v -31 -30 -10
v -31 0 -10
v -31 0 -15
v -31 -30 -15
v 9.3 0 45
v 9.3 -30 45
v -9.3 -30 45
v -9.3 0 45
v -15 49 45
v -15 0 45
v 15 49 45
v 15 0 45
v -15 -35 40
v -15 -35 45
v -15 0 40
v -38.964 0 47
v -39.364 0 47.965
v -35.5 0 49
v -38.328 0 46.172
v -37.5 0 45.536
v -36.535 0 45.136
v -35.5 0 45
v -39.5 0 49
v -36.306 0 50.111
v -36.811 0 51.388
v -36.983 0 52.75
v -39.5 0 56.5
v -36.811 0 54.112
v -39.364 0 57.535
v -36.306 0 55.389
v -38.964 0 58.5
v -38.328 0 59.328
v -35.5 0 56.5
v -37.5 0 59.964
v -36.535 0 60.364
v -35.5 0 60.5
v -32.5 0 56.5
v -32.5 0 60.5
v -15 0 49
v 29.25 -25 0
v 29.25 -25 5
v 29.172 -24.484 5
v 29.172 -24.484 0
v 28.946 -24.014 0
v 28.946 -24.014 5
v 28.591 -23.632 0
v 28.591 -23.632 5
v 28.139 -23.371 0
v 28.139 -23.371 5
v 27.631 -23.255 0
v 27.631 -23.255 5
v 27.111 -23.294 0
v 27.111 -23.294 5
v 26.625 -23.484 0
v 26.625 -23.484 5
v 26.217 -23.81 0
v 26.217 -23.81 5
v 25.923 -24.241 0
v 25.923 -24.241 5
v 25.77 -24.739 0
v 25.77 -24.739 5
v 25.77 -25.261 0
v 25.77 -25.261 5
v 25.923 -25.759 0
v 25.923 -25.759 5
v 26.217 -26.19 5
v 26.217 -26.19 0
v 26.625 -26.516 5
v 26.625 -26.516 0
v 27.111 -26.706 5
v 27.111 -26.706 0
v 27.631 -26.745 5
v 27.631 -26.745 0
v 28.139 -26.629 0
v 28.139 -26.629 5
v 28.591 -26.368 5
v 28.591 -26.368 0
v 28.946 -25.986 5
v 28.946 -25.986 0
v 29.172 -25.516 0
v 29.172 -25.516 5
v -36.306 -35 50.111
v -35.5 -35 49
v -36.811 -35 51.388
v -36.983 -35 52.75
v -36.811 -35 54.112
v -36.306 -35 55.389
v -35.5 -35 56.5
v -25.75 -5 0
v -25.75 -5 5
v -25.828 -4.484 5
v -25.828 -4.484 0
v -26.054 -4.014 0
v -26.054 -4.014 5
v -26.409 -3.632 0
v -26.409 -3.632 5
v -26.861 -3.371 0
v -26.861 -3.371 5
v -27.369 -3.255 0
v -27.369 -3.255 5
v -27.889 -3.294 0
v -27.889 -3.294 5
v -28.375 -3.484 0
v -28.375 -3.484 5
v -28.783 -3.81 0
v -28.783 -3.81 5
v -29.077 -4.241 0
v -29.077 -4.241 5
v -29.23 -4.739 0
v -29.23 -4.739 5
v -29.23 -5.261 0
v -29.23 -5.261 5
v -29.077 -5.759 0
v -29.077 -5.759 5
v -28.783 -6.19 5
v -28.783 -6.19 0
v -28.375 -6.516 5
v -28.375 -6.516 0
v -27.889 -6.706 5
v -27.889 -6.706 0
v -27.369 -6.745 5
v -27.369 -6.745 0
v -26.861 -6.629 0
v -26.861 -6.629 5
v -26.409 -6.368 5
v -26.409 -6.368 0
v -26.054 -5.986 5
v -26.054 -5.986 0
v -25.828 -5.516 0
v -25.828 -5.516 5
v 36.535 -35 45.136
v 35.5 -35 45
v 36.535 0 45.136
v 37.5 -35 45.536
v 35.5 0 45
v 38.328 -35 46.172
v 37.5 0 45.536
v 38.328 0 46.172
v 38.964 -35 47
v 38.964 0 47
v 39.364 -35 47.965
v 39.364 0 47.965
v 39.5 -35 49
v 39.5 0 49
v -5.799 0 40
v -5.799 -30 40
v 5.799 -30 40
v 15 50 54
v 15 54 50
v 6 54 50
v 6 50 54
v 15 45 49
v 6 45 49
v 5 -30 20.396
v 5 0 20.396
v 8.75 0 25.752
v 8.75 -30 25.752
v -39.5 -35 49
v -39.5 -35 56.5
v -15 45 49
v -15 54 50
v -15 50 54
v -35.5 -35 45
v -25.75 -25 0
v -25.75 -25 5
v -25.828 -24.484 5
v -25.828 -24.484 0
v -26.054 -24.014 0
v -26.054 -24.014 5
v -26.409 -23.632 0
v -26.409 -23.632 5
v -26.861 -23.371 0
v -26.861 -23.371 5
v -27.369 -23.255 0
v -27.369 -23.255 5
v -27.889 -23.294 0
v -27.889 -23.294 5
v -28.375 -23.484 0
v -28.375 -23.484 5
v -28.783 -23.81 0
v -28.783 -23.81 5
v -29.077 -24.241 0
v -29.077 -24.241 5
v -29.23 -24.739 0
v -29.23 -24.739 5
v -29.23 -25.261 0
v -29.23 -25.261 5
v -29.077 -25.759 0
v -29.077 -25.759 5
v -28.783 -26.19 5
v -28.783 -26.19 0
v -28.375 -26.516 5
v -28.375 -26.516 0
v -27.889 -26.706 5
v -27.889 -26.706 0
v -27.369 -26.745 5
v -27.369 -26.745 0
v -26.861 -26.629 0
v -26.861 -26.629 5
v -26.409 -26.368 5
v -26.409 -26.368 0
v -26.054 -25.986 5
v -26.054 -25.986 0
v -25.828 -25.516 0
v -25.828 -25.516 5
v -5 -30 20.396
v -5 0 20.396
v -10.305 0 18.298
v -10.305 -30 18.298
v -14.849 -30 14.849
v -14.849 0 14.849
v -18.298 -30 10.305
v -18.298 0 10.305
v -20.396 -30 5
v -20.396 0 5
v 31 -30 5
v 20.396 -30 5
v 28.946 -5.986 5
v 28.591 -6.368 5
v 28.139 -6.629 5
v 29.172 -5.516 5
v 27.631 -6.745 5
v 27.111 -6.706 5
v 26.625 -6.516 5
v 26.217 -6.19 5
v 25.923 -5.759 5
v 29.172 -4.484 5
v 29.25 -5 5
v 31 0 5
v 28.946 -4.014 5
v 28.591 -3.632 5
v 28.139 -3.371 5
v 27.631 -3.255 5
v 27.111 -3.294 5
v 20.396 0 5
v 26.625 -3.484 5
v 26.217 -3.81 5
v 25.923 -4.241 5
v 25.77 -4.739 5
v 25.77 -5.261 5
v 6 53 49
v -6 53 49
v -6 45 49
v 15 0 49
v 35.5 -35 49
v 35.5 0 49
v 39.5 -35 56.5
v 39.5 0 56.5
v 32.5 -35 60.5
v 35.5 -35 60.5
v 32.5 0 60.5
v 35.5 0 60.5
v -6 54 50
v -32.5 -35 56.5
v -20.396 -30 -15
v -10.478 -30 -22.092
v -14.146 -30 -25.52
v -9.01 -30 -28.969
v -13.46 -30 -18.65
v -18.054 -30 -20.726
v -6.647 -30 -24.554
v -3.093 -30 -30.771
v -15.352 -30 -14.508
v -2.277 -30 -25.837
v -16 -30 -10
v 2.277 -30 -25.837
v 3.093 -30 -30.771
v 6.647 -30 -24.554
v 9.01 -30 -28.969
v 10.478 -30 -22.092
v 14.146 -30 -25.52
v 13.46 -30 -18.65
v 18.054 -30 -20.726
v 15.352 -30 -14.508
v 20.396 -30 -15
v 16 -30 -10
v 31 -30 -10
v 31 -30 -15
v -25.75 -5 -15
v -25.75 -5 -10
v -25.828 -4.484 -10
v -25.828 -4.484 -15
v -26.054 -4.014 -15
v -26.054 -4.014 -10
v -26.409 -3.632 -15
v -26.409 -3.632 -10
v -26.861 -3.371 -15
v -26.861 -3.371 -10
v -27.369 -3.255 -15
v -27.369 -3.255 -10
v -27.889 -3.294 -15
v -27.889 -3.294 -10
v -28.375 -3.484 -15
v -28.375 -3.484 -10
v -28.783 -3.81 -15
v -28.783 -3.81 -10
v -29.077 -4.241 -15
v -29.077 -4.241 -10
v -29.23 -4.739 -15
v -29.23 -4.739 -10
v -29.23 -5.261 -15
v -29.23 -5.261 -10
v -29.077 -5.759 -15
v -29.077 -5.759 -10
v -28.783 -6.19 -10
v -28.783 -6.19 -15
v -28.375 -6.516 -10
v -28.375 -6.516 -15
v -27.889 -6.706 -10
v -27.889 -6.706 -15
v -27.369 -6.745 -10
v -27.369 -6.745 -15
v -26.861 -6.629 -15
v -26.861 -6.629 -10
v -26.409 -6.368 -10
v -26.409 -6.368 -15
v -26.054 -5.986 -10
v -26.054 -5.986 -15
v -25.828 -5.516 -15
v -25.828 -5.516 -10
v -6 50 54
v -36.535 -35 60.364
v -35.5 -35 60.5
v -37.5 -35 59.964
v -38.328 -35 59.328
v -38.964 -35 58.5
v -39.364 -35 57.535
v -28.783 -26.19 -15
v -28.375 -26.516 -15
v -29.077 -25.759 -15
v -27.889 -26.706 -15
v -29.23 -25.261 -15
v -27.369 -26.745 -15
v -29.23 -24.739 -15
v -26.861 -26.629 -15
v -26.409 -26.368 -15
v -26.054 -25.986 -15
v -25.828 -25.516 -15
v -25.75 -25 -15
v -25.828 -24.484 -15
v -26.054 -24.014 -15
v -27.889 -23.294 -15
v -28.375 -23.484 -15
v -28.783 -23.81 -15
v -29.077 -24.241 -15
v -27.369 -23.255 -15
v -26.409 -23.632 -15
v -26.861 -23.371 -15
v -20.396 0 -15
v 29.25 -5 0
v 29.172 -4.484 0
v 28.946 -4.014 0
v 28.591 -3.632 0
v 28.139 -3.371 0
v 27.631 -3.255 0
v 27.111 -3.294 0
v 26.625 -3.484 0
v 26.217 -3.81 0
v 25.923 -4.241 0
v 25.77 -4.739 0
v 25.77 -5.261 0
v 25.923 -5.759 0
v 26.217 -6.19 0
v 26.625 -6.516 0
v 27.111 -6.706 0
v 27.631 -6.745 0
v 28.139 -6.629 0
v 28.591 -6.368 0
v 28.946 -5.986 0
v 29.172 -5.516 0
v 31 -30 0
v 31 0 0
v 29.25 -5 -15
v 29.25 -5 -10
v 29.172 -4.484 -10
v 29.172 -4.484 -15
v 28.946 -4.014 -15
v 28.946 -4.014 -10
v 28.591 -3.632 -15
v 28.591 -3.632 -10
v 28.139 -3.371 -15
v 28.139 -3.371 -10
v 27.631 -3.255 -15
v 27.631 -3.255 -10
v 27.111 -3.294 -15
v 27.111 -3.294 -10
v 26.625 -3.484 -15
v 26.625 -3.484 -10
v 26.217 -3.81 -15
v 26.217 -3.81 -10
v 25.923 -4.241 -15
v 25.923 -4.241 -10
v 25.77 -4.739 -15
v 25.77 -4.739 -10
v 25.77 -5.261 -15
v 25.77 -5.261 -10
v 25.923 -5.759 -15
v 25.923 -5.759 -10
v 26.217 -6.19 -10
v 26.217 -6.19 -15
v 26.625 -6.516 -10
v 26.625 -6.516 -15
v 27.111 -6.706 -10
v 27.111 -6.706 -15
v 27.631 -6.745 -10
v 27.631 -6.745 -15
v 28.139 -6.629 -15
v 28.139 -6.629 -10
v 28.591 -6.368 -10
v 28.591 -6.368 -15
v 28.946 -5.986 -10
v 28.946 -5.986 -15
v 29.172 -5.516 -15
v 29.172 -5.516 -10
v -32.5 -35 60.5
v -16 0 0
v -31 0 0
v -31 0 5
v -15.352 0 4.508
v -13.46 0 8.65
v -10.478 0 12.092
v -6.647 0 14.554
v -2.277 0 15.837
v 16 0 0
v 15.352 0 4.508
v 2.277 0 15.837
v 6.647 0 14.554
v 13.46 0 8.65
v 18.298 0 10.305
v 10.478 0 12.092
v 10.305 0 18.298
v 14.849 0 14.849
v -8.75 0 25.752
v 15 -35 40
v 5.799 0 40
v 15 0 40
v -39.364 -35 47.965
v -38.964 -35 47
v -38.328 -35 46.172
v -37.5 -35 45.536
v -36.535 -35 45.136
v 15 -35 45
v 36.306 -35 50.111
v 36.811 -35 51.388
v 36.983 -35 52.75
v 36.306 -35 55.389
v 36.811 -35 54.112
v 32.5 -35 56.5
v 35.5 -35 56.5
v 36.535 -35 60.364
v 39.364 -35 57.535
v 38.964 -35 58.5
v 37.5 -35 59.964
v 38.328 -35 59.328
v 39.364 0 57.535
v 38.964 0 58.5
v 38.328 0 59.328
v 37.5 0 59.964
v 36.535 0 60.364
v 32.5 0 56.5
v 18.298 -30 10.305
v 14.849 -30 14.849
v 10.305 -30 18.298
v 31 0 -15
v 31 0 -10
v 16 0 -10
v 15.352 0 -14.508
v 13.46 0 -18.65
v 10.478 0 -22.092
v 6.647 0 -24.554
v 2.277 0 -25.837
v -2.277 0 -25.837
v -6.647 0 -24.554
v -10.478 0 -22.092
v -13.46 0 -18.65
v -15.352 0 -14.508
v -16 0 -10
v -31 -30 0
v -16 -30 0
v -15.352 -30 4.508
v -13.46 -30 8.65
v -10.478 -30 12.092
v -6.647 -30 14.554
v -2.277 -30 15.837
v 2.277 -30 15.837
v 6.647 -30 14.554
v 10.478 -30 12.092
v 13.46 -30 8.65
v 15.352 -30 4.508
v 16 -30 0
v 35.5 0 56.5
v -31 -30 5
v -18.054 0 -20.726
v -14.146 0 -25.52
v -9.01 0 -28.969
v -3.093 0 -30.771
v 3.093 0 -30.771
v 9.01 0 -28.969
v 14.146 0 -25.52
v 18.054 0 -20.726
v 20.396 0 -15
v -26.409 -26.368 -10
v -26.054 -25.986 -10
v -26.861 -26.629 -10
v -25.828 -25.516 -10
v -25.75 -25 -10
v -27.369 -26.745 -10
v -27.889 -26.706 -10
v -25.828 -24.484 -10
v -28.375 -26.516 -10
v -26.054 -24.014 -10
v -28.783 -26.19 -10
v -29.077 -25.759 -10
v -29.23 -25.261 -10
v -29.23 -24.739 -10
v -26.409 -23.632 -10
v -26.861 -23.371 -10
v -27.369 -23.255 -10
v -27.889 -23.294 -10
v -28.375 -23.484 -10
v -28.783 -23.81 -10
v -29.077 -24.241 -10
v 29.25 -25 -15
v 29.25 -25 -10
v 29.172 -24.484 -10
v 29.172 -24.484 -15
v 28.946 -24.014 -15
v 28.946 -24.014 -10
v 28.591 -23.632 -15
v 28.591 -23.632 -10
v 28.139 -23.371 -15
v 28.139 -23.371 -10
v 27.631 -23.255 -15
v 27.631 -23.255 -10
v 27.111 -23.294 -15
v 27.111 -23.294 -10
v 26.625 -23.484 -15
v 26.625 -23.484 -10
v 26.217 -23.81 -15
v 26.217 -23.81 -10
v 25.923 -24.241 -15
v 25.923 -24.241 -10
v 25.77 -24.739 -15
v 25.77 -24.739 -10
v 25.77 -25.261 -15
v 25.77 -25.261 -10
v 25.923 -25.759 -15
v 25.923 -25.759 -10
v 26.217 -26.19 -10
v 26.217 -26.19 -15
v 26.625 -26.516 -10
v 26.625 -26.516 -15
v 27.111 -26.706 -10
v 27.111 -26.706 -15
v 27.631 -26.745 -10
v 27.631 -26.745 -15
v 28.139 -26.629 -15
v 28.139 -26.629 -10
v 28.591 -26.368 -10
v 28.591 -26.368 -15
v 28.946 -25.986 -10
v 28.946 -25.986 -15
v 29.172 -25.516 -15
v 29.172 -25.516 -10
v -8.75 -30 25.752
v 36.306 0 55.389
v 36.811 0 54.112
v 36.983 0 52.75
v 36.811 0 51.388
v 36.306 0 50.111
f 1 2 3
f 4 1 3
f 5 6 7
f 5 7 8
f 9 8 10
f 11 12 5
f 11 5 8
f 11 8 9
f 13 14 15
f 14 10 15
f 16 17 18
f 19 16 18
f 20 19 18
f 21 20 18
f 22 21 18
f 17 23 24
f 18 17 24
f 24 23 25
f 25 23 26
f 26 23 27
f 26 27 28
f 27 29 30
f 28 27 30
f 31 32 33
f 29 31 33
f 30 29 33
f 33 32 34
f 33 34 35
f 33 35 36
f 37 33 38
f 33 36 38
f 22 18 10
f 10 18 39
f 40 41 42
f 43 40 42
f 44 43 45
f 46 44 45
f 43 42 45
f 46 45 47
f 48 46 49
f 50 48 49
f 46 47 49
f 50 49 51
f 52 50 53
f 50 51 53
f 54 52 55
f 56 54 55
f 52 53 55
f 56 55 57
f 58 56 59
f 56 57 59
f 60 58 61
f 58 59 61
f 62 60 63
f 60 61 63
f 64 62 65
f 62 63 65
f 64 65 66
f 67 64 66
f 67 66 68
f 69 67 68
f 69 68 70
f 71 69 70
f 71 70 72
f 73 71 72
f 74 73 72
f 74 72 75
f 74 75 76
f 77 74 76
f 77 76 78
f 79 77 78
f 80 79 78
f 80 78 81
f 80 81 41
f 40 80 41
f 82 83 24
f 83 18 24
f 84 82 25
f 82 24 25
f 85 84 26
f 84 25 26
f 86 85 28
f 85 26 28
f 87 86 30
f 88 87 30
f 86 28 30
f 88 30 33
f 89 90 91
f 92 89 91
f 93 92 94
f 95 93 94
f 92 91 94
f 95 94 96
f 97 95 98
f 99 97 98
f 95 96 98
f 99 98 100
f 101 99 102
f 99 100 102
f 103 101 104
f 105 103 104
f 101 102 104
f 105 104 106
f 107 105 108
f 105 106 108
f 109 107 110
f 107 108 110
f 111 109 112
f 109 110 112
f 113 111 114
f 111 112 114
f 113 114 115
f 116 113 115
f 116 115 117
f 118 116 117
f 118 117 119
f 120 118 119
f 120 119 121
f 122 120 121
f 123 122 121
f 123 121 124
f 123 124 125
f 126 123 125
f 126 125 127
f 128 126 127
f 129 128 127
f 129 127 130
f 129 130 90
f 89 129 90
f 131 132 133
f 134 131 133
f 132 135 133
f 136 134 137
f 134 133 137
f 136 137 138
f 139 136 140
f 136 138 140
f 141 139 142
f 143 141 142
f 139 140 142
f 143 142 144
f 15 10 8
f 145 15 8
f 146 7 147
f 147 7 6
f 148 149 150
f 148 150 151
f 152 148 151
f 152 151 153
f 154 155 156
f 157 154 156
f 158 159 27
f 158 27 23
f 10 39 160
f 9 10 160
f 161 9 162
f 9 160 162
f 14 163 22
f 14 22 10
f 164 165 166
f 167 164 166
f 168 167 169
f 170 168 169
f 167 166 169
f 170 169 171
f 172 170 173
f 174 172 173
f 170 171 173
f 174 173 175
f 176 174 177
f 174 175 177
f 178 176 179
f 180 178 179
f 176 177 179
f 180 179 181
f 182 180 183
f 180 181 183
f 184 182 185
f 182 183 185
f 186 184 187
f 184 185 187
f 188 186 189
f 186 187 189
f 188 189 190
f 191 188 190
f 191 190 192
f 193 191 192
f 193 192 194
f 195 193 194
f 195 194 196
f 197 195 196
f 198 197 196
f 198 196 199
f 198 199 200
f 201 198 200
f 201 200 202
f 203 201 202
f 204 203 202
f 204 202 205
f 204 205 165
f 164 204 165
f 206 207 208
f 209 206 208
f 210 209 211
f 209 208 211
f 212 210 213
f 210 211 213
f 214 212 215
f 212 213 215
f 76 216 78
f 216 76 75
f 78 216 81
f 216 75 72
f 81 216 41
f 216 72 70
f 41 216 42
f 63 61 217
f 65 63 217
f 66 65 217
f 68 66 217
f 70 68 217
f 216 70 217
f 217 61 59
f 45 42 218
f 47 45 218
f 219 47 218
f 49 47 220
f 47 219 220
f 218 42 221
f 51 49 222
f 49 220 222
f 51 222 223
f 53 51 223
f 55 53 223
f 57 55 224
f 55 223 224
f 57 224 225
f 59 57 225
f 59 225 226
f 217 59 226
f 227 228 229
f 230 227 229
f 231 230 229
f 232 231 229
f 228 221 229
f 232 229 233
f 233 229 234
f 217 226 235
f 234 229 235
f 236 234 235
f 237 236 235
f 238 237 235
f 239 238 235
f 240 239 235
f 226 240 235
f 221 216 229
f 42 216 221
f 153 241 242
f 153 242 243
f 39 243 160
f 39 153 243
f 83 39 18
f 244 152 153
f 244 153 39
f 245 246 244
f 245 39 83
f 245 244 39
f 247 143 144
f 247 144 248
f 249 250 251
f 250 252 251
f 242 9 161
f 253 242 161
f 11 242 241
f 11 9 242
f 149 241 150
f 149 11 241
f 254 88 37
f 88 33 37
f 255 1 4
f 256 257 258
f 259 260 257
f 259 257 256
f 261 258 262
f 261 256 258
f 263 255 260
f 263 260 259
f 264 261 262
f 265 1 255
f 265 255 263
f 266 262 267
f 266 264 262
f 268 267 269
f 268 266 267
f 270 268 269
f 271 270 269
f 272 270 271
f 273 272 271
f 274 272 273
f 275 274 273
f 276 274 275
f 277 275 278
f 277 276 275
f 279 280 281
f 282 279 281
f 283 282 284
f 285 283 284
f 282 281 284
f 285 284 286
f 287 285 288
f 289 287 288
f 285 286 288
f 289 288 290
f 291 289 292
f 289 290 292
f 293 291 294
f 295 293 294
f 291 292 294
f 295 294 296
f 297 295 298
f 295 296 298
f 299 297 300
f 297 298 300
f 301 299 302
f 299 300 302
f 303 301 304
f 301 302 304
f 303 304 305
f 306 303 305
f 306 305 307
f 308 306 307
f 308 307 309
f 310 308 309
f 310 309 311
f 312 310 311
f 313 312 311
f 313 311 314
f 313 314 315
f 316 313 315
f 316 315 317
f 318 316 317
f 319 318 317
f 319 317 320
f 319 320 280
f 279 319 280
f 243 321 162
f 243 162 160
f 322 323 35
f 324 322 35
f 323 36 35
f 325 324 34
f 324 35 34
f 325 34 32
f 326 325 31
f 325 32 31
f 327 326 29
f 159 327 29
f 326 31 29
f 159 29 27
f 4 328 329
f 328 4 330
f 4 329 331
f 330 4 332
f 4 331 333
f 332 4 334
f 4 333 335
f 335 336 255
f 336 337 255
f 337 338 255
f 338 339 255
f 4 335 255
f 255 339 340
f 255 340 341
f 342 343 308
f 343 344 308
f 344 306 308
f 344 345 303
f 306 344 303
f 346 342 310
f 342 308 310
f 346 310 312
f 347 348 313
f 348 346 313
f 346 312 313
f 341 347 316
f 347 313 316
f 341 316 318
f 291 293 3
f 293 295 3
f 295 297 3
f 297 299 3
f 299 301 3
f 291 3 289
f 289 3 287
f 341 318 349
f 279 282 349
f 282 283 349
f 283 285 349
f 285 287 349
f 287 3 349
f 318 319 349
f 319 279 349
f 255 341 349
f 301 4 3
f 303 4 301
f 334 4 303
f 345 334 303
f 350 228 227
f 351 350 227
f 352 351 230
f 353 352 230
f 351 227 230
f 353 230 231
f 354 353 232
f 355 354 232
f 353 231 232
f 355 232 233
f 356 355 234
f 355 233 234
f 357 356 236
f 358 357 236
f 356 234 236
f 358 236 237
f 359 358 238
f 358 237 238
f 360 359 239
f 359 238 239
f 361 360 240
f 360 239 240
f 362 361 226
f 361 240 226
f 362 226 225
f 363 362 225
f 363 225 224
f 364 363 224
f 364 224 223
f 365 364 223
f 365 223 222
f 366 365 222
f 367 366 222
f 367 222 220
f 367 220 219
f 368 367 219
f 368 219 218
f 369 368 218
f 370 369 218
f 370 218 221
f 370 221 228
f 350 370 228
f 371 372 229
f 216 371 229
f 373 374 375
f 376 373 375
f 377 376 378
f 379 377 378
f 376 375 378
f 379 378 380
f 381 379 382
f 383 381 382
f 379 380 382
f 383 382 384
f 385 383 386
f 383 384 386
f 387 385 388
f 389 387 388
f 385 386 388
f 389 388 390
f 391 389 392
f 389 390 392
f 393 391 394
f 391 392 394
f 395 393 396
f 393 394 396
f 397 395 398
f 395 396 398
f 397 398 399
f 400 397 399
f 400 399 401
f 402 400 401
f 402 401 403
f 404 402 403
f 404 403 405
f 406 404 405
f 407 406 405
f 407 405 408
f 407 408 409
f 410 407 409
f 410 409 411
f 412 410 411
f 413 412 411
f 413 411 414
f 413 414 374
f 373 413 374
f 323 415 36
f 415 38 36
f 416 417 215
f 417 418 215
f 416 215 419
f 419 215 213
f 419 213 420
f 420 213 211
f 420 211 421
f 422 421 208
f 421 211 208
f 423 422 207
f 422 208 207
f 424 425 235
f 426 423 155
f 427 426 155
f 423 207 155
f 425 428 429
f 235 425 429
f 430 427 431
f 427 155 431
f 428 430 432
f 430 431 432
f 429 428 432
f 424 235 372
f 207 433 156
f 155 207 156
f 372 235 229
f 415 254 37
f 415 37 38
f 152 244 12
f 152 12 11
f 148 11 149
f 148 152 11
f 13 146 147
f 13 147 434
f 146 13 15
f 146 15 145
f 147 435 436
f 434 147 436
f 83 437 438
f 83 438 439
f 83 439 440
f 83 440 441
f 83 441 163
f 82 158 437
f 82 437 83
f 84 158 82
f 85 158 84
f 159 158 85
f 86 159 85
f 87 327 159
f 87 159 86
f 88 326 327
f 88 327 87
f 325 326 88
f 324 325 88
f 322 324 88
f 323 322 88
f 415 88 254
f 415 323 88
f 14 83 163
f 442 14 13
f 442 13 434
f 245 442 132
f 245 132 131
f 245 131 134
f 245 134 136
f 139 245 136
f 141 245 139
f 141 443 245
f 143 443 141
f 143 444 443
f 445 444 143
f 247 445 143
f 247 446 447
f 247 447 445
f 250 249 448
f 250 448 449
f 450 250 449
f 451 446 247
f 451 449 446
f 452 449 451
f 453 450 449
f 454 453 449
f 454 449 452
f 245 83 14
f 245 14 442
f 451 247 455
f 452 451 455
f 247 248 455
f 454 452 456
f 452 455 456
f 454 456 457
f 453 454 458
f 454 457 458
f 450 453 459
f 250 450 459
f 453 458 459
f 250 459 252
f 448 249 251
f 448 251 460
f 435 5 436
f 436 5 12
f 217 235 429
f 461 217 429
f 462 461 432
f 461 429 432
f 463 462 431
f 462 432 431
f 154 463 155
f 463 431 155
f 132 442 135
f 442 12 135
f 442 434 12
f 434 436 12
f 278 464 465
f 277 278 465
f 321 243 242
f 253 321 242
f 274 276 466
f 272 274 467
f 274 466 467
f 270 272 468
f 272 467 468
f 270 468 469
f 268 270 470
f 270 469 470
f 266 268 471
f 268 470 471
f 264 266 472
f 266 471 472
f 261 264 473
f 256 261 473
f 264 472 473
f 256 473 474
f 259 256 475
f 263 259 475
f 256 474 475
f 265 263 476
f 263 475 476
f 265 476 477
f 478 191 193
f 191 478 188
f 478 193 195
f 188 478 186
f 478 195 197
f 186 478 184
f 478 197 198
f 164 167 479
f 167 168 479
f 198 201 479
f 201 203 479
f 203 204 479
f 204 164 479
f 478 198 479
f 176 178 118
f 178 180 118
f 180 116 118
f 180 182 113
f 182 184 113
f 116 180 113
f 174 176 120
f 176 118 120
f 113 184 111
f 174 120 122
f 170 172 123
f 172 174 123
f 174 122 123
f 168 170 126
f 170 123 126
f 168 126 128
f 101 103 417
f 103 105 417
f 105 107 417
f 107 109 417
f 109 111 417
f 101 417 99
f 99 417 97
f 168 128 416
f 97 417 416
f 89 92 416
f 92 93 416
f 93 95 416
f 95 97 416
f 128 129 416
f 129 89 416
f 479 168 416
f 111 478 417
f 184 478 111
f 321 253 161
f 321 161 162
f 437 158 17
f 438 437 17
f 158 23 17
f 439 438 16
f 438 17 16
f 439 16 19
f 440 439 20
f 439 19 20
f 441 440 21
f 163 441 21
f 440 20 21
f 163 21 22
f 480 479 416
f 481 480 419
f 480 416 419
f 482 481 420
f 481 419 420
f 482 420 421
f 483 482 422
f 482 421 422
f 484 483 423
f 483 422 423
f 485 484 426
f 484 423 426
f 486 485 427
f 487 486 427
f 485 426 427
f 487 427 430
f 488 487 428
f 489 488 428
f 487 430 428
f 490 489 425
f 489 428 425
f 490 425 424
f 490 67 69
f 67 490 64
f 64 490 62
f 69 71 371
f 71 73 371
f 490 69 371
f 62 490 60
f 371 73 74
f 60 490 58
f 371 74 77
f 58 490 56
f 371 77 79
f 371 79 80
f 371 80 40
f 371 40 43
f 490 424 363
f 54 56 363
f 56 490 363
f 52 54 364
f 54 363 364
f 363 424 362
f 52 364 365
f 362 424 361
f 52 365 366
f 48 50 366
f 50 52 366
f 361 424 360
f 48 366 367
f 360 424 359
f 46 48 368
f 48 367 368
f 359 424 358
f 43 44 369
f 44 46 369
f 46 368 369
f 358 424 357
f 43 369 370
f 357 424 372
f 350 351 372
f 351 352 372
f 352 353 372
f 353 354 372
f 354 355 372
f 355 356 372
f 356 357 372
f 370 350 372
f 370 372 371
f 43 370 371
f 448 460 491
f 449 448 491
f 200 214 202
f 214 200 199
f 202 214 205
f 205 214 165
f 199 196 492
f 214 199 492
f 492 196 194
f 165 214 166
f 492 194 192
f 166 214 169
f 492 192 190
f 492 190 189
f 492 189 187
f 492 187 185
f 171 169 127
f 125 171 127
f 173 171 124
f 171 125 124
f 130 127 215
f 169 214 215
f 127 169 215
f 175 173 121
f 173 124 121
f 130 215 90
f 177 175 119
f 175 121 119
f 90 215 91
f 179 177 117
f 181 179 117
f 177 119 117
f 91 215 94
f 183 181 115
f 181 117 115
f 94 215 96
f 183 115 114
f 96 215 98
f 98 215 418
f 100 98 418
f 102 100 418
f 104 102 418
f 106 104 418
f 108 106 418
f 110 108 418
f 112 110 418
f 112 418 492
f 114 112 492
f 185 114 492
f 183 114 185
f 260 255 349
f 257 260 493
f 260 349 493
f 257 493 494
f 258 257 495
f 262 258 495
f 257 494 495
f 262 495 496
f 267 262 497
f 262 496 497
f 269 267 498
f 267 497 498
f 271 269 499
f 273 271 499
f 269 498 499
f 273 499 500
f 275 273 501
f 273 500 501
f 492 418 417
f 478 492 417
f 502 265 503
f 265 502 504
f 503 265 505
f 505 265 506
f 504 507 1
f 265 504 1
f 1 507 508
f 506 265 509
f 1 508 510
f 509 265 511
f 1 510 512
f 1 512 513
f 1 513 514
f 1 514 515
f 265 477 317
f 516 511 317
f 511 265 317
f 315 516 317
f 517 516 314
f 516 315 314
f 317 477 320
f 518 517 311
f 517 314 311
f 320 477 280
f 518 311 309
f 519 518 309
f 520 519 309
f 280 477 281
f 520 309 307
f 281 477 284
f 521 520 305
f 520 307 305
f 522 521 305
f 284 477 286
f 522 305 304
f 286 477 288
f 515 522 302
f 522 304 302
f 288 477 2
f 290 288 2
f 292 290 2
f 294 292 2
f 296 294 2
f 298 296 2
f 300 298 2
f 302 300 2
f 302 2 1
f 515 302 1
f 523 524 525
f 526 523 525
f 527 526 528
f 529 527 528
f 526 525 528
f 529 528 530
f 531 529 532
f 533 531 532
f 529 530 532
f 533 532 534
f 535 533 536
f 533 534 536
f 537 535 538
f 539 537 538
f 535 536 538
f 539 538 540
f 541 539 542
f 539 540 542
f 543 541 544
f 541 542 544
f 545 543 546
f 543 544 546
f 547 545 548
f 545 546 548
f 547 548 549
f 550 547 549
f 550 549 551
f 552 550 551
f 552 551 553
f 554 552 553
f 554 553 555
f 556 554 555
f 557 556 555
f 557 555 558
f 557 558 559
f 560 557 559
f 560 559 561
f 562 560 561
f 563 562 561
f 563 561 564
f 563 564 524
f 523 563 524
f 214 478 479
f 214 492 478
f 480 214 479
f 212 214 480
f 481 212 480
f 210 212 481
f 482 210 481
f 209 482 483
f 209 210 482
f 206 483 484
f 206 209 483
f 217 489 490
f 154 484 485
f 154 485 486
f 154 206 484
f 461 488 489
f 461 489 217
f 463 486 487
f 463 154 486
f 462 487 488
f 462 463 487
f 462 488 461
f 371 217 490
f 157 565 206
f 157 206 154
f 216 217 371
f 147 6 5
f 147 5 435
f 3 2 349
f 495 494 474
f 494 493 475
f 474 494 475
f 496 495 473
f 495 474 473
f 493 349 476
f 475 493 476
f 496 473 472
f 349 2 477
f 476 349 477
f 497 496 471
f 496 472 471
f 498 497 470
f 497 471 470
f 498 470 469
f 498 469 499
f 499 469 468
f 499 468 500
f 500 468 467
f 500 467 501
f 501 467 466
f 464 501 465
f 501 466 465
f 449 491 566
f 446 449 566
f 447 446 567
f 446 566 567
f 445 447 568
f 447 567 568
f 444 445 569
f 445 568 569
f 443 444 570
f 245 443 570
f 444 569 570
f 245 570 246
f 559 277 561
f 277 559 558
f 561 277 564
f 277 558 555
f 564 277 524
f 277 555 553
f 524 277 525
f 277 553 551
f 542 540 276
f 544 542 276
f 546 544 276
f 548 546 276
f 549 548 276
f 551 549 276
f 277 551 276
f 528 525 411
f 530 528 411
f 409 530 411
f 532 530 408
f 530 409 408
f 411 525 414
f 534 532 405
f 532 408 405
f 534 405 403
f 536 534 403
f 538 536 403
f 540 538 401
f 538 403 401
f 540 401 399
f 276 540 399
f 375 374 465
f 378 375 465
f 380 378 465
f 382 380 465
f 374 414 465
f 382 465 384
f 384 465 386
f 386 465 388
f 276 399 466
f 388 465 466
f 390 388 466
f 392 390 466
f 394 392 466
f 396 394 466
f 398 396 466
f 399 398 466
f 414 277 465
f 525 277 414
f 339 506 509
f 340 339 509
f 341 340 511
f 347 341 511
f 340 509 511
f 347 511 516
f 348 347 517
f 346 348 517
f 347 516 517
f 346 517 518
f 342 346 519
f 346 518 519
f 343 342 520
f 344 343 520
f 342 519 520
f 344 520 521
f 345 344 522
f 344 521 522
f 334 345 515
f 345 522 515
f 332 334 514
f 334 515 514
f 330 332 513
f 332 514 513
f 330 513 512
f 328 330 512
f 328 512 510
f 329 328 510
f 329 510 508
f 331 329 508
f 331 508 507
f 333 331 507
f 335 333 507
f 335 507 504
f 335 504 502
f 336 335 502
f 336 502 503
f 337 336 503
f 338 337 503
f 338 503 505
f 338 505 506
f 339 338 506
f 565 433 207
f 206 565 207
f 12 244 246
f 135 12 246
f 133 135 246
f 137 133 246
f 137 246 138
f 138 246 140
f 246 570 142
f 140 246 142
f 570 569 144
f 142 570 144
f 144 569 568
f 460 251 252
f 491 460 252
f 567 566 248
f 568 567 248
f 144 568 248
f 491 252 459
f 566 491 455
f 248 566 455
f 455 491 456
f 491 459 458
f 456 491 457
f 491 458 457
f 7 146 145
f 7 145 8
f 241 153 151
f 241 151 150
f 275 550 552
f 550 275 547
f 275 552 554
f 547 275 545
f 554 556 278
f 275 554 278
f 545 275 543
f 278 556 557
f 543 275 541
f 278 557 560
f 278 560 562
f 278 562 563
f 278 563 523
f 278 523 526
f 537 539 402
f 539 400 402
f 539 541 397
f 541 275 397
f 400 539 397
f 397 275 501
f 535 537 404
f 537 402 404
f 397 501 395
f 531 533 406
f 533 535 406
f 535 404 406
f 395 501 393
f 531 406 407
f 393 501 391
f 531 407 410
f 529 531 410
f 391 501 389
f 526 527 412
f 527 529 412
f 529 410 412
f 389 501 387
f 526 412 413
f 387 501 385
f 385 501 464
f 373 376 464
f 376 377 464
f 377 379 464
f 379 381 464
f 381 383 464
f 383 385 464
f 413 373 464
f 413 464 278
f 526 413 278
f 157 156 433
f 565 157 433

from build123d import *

# Parameters (mm, degrees)
F3_DEPTH      = 30
F4_DEPTH      = 5
F6_DEPTH      = 15
F6_DEPTH_BACK = 15
F7_DEPTH      = 6
F8_DEPTH      = 30
F9_DEPTH      = 30
F10_R         = 1.75
F11_DEPTH     = 50


# Not quite as in the source:
# - a feature names something its author has since deleted; it is built from what else it names


with BuildPart() as f3:
    # F2 (on offset) → F3 (new body)
    with BuildSketch(Plane.XZ.offset(30)):
        with BuildLine():
            Line((35.5, 49), (-35.5, 49))
            ThreePointArc((-35.5, 49), (-36.9829280499, 52.75), (-35.5, 56.5))
            Line((-35.5, 56.5), (-32.5, 56.5))
            Line((-32.5, 56.5), (-32.5, 60.5))
            Line((-32.5, 60.5), (-35.5, 60.5))
            ThreePointArc((-35.5, 60.5), (-38.3284271247, 59.3284271247), (-39.5, 56.5))
            Line((-39.5, 56.5), (-39.5, 49))
            ThreePointArc((-39.5, 49), (-38.3284271247, 46.1715728753), (-35.5, 45))
            Line((-35.5, 45), (-15, 45))
            Line((-15, 45), (-15, 40))
            Line((-15, 40), (-5.798962309, 40))
            Line((-5.798962309, 40), (-9.3, 45))
            Line((-9.3, 45), (9.3, 45))
            Line((9.3, 45), (5.798962309, 40))
            Line((5.798962309, 40), (15, 40))
            Line((15, 40), (15, 45))
            Line((15, 45), (35.5, 45))
            ThreePointArc((35.5, 45), (38.3284271247, 46.1715728753), (39.5, 49))
            Line((39.5, 49), (39.5, 56.5))
            ThreePointArc((39.5, 56.5), (38.3284271247, 59.3284271247), (35.5, 60.5))
            Line((35.5, 60.5), (32.5, 60.5))
            Line((32.5, 60.5), (32.5, 56.5))
            Line((32.5, 56.5), (35.5, 56.5))
            ThreePointArc((35.5, 56.5), (36.9829280499, 52.75), (35.5, 49))
        make_face()
    extrude(amount=-F3_DEPTH)

    # F2 (on offset) → F4 (join)
    with BuildSketch(Plane.XZ.offset(30)):
        with BuildLine():
            Line((35.5, 49), (-35.5, 49))
            ThreePointArc((-35.5, 49), (-36.9829280499, 52.75), (-35.5, 56.5))
            Line((-35.5, 56.5), (-32.5, 56.5))
            Line((-32.5, 56.5), (-32.5, 60.5))
            Line((-32.5, 60.5), (-35.5, 60.5))
            ThreePointArc((-35.5, 60.5), (-38.3284271247, 59.3284271247), (-39.5, 56.5))
            Line((-39.5, 56.5), (-39.5, 49))
            ThreePointArc((-39.5, 49), (-38.3284271247, 46.1715728753), (-35.5, 45))
            Line((-35.5, 45), (-15, 45))
            Line((-15, 45), (-15, 40))
            Line((-15, 40), (-5.798962309, 40))
            Line((-5.798962309, 40), (-9.3, 45))
            Line((-9.3, 45), (9.3, 45))
            Line((9.3, 45), (5.798962309, 40))
            Line((5.798962309, 40), (15, 40))
            Line((15, 40), (15, 45))
            Line((15, 45), (35.5, 45))
            ThreePointArc((35.5, 45), (38.3284271247, 46.1715728753), (39.5, 49))
            Line((39.5, 49), (39.5, 56.5))
            ThreePointArc((39.5, 56.5), (38.3284271247, 59.3284271247), (35.5, 60.5))
            Line((35.5, 60.5), (32.5, 60.5))
            Line((32.5, 60.5), (32.5, 56.5))
            Line((32.5, 56.5), (35.5, 56.5))
            ThreePointArc((35.5, 56.5), (36.9829280499, 52.75), (35.5, 49))
        make_face()
        Polygon((-9.3, 45), (-5.798962309, 40), (5.798962309, 40), (9.3, 45), align=None)
    extrude(amount=F4_DEPTH)

    # F5 (on Right) → F6 (join, two sides)
    with BuildSketch(Plane.YZ) as f6_sk:
        Polygon((45, 49), (0, 49), (0, 45), (49, 45), (53, 49), align=None)
        Polygon((50, 54), (45, 49), (53, 49), (54, 50), align=None)
    extrude(amount=F6_DEPTH)
    extrude(f6_sk.sketch, amount=-F6_DEPTH_BACK)

    # F5 (on Right) → F7 (cut, symmetric)
    with BuildSketch(Plane.YZ):
        Polygon((50, 54), (45, 49), (53, 49), (54, 50), align=None)
    extrude(amount=F7_DEPTH, both=True, mode=Mode.SUBTRACT)


with BuildPart() as f8:
    # F0 (on Front) → F8 (new body)
    with BuildSketch(Plane.XZ):
        with BuildLine():
            Line((-31, 0), (-21, 0))
            ThreePointArc((-21, 0), (-20.8484728355, 2.5181700556), (-20.3960780544, 5))
            Line((-20.3960780544, 5), (-31, 5))
            Line((-31, 5), (-31, 0))
        make_face()
        with BuildLine():
            Line((-21, 0), (-16, 0))
            Line((-16, 0), (-16, 5))
            Line((-16, 5), (-20.3960780544, 5))
            ThreePointArc((-20.3960780544, 5), (-20.8484728355, 2.5181700556), (-21, 0))
        make_face()
        with BuildLine():
            ThreePointArc((-16, 0), (0, 16), (16, 0))
            Line((16, 0), (16, 5))
            Line((16, 5), (20.3960780544, 5))
            ThreePointArc((20.3960780544, 5), (14.8492424049, 14.8492424049), (5, 20.3960780544))
            ThreePointArc((5, 20.3960780544), (0, 21), (-5, 20.3960780544))
            ThreePointArc((-5, 20.3960780544), (-14.8492424049, 14.8492424049), (-20.3960780544, 5))
            Line((-20.3960780544, 5), (-16, 5))
            Line((-16, 5), (-16, 0))
        make_face()
        with BuildLine():
            Line((16, 5), (16, 0))
            Line((16, 0), (21, 0))
            ThreePointArc((21, 0), (20.8484728355, 2.5181700556), (20.3960780544, 5))
            Line((20.3960780544, 5), (16, 5))
        make_face()
        with BuildLine():
            ThreePointArc((20.3960780544, 5), (20.8484728355, 2.5181700556), (21, 0))
            Line((21, 0), (31, 0))
            Line((31, 0), (31, 5))
            Line((31, 5), (20.3960780544, 5))
        make_face()
        with BuildLine():
            ThreePointArc((-5, 20.3960780544), (0, 21), (5, 20.3960780544))
            Line((5, 20.3960780544), (8.75, 25.7516330797))
            Line((8.75, 25.7516330797), (-8.75, 25.7516330797))
            Line((-8.75, 25.7516330797), (-5, 20.3960780544))
        make_face()
    extrude(amount=F8_DEPTH)


with BuildPart() as f9:
    # F0 (on Front) → F9 (new body)
    with BuildSketch(Plane.XZ):
        with BuildLine():
            ThreePointArc((-20.3960780544, -15), (-20.8484728355, -12.5181700556), (-21, -10))
            Line((-21, -10), (-31, -10))
            Line((-31, -10), (-31, -15))
            Line((-31, -15), (-20.3960780544, -15))
        make_face()
        with BuildLine():
            Line((-16, -15), (-16, -10))
            Line((-16, -10), (-21, -10))
            ThreePointArc((-21, -10), (-20.8484728355, -12.5181700556), (-20.3960780544, -15))
            Line((-20.3960780544, -15), (-16, -15))
        make_face()
        with BuildLine():
            ThreePointArc((16, -10), (0, -26), (-16, -10))
            Line((-16, -10), (-16, -15))
            Line((-16, -15), (-20.3960780544, -15))
            ThreePointArc((-20.3960780544, -15), (0, -31), (20.3960780544, -15))
            Line((20.3960780544, -15), (16, -15))
            Line((16, -15), (16, -10))
        make_face()
        with BuildLine():
            Line((21, -10), (16, -10))
            Line((16, -10), (16, -15))
            Line((16, -15), (20.3960780544, -15))
            ThreePointArc((20.3960780544, -15), (20.8484728355, -12.5181700556), (21, -10))
        make_face()
        with BuildLine():
            Line((31, -10), (21, -10))
            ThreePointArc((21, -10), (20.8484728355, -12.5181700556), (20.3960780544, -15))
            Line((20.3960780544, -15), (31, -15))
            Line((31, -15), (31, -10))
        make_face()
    extrude(amount=F9_DEPTH)


with BuildPart() as f11_tool:
    # F10 (on face) → F11 (new body)
    with BuildSketch(Plane.XY.offset(5)):
        with Locations((-27.5, -25)):
            Circle(F10_R)
        with Locations((-27.5, -5)):
            Circle(F10_R)
        with Locations((27.5, -5)):
            Circle(F10_R)
        with Locations((27.5, -25)):
            Circle(F10_R)
    extrude(amount=-F11_DEPTH)


with BuildPart() as f8_1:
    add(f8.part)

    # F11: cut by f11_tool
    add(f11_tool.part, mode=Mode.SUBTRACT)


with BuildPart() as f9_1:
    add(f9.part)

    # F11: cut by f11_tool
    add(f11_tool.part, mode=Mode.SUBTRACT)


solid = Compound([f3.part, f8_1.part, f9_1.part])
